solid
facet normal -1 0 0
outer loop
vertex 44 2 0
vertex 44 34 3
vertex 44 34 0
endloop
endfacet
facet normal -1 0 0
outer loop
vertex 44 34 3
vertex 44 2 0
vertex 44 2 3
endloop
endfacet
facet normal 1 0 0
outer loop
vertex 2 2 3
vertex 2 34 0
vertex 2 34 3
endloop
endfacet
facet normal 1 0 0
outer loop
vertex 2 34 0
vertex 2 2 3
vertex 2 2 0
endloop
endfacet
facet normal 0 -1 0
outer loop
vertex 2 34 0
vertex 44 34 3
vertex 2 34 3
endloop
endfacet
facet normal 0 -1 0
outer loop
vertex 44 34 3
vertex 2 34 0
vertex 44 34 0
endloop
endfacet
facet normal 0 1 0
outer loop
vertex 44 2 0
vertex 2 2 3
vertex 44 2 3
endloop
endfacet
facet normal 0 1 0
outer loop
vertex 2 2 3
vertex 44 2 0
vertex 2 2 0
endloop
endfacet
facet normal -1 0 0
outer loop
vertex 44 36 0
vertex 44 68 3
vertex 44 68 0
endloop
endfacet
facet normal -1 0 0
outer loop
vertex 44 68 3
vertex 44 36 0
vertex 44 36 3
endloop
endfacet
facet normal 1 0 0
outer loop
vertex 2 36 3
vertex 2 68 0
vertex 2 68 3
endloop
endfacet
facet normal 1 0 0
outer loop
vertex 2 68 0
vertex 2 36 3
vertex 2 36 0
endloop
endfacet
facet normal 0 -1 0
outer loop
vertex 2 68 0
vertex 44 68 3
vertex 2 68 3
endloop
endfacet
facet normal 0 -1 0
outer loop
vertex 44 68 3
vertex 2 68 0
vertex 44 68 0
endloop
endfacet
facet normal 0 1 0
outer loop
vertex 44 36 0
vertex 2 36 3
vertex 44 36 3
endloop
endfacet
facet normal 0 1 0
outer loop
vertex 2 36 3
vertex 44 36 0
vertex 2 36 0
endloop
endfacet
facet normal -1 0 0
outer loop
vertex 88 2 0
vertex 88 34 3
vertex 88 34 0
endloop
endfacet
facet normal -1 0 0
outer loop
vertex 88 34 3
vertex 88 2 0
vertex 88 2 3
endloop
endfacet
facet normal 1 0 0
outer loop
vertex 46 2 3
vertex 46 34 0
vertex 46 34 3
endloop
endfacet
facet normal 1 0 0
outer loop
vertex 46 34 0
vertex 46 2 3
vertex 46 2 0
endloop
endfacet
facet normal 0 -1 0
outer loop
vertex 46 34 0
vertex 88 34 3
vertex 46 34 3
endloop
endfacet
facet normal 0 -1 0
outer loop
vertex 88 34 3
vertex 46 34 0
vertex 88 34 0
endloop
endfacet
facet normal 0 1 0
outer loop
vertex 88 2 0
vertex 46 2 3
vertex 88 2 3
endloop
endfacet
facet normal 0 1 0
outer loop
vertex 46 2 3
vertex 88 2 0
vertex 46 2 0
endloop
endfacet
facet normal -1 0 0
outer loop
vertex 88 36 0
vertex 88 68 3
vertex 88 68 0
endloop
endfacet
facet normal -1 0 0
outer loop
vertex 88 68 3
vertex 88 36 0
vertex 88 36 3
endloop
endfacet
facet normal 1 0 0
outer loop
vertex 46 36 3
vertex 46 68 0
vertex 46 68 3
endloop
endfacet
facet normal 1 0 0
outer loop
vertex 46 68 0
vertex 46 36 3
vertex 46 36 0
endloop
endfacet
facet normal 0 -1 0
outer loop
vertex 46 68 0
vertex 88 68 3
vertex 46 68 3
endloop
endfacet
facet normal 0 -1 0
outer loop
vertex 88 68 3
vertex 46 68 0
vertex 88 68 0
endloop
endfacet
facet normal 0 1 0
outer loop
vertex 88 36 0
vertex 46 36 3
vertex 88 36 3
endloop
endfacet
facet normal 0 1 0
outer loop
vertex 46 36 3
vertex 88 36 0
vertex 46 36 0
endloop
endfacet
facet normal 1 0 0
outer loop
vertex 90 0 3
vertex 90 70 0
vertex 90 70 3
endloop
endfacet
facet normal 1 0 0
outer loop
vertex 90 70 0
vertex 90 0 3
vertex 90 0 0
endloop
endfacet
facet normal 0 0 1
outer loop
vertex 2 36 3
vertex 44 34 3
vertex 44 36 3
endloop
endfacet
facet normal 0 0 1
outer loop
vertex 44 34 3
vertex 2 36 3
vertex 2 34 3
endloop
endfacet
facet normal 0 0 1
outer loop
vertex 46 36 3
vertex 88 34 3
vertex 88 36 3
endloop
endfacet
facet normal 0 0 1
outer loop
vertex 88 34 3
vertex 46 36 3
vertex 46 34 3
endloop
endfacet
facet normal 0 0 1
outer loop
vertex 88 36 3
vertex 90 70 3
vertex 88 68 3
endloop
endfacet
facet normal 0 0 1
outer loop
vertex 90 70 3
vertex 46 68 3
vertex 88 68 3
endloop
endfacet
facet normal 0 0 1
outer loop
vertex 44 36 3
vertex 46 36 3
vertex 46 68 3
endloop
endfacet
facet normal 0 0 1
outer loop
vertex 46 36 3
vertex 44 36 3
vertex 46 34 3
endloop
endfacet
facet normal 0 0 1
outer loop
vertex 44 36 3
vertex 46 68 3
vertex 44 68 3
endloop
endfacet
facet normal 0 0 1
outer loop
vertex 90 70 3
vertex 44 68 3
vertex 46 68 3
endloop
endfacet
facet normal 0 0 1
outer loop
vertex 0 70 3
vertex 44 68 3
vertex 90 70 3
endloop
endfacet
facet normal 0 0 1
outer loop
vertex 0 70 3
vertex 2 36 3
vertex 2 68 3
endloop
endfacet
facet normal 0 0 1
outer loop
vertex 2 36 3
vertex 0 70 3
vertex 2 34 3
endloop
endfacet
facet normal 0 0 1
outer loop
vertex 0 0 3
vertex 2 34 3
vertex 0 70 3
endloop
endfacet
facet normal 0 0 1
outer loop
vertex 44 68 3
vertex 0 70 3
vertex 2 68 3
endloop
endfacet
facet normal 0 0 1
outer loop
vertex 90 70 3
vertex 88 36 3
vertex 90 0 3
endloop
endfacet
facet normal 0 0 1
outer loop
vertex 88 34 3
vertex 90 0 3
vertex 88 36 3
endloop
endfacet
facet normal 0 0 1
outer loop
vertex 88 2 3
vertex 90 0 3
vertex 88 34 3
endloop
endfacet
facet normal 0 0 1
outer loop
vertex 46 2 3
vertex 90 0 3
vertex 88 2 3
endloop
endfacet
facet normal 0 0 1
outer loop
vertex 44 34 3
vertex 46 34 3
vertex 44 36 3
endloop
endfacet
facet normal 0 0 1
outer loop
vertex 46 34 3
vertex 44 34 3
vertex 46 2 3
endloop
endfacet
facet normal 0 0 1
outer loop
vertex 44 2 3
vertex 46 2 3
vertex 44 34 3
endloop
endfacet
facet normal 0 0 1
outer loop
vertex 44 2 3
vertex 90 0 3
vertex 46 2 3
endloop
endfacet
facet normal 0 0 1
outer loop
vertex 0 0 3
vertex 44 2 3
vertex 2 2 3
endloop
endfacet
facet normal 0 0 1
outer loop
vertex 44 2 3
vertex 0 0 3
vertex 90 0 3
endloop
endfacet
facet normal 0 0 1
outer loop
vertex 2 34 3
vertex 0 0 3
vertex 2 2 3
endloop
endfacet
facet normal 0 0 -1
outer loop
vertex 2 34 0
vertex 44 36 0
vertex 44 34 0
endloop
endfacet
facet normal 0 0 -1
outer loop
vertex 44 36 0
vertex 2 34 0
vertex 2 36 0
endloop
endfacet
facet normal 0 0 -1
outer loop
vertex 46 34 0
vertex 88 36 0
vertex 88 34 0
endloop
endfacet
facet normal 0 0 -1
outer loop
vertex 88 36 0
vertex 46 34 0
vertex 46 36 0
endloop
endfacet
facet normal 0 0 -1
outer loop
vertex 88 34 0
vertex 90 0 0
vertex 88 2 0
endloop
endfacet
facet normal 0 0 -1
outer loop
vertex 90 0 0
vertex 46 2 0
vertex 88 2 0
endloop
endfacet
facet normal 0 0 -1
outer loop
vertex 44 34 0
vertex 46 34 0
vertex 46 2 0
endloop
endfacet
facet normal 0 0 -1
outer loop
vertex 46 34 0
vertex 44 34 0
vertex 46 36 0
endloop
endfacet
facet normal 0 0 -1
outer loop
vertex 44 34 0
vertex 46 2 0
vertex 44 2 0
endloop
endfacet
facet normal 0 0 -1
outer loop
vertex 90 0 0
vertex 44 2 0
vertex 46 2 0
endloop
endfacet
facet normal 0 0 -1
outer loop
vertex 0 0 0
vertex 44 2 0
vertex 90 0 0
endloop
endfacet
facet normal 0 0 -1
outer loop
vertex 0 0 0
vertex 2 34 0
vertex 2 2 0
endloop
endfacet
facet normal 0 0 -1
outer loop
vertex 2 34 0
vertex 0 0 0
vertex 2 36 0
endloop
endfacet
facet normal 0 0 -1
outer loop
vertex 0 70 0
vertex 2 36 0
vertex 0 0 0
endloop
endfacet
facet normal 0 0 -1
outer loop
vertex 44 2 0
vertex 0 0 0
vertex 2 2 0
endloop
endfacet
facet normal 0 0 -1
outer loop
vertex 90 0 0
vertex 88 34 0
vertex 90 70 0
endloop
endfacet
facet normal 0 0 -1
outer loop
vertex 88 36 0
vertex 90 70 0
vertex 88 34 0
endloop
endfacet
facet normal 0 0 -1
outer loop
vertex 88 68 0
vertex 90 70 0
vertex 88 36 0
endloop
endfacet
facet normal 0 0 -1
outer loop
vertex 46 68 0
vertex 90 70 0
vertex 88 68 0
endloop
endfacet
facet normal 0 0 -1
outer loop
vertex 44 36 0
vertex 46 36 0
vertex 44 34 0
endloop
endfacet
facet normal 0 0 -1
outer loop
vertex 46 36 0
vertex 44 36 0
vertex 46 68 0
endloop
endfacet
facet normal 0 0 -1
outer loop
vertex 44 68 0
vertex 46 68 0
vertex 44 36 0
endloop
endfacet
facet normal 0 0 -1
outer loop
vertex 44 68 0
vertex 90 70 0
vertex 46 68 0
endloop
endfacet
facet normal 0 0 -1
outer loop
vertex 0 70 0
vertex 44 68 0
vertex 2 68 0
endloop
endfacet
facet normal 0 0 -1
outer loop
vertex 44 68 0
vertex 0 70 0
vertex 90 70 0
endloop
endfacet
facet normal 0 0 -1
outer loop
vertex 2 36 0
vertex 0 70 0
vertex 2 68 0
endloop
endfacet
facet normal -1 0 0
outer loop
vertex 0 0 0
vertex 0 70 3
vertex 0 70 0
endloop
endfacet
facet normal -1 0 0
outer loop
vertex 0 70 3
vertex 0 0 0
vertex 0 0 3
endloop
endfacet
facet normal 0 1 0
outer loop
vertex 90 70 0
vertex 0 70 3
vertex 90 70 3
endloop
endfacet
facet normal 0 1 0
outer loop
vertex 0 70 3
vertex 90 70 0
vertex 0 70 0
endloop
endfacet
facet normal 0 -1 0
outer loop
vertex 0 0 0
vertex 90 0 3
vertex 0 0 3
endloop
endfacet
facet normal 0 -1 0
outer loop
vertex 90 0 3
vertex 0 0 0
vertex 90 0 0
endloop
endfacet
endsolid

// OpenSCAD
$fn = 64;

plate_w = 90;
plate_h = 70;
plate_t = 3.0;
wall = 2.0;
rib = 2.0;

inner_w = plate_w - 2 * wall;
inner_h = plate_h - 2 * wall;
window_w = (inner_w - rib) / 2;
window_h = (inner_h - rib) / 2;

difference() {
    cube([plate_w, plate_h, plate_t]);

    for (x = [wall, wall + window_w + rib]) {
        for (y = [wall, wall + window_h + rib]) {
            translate([x, y, -0.1])
                cube([window_w, window_h, plate_t + 0.2]);
        }
    }
}
